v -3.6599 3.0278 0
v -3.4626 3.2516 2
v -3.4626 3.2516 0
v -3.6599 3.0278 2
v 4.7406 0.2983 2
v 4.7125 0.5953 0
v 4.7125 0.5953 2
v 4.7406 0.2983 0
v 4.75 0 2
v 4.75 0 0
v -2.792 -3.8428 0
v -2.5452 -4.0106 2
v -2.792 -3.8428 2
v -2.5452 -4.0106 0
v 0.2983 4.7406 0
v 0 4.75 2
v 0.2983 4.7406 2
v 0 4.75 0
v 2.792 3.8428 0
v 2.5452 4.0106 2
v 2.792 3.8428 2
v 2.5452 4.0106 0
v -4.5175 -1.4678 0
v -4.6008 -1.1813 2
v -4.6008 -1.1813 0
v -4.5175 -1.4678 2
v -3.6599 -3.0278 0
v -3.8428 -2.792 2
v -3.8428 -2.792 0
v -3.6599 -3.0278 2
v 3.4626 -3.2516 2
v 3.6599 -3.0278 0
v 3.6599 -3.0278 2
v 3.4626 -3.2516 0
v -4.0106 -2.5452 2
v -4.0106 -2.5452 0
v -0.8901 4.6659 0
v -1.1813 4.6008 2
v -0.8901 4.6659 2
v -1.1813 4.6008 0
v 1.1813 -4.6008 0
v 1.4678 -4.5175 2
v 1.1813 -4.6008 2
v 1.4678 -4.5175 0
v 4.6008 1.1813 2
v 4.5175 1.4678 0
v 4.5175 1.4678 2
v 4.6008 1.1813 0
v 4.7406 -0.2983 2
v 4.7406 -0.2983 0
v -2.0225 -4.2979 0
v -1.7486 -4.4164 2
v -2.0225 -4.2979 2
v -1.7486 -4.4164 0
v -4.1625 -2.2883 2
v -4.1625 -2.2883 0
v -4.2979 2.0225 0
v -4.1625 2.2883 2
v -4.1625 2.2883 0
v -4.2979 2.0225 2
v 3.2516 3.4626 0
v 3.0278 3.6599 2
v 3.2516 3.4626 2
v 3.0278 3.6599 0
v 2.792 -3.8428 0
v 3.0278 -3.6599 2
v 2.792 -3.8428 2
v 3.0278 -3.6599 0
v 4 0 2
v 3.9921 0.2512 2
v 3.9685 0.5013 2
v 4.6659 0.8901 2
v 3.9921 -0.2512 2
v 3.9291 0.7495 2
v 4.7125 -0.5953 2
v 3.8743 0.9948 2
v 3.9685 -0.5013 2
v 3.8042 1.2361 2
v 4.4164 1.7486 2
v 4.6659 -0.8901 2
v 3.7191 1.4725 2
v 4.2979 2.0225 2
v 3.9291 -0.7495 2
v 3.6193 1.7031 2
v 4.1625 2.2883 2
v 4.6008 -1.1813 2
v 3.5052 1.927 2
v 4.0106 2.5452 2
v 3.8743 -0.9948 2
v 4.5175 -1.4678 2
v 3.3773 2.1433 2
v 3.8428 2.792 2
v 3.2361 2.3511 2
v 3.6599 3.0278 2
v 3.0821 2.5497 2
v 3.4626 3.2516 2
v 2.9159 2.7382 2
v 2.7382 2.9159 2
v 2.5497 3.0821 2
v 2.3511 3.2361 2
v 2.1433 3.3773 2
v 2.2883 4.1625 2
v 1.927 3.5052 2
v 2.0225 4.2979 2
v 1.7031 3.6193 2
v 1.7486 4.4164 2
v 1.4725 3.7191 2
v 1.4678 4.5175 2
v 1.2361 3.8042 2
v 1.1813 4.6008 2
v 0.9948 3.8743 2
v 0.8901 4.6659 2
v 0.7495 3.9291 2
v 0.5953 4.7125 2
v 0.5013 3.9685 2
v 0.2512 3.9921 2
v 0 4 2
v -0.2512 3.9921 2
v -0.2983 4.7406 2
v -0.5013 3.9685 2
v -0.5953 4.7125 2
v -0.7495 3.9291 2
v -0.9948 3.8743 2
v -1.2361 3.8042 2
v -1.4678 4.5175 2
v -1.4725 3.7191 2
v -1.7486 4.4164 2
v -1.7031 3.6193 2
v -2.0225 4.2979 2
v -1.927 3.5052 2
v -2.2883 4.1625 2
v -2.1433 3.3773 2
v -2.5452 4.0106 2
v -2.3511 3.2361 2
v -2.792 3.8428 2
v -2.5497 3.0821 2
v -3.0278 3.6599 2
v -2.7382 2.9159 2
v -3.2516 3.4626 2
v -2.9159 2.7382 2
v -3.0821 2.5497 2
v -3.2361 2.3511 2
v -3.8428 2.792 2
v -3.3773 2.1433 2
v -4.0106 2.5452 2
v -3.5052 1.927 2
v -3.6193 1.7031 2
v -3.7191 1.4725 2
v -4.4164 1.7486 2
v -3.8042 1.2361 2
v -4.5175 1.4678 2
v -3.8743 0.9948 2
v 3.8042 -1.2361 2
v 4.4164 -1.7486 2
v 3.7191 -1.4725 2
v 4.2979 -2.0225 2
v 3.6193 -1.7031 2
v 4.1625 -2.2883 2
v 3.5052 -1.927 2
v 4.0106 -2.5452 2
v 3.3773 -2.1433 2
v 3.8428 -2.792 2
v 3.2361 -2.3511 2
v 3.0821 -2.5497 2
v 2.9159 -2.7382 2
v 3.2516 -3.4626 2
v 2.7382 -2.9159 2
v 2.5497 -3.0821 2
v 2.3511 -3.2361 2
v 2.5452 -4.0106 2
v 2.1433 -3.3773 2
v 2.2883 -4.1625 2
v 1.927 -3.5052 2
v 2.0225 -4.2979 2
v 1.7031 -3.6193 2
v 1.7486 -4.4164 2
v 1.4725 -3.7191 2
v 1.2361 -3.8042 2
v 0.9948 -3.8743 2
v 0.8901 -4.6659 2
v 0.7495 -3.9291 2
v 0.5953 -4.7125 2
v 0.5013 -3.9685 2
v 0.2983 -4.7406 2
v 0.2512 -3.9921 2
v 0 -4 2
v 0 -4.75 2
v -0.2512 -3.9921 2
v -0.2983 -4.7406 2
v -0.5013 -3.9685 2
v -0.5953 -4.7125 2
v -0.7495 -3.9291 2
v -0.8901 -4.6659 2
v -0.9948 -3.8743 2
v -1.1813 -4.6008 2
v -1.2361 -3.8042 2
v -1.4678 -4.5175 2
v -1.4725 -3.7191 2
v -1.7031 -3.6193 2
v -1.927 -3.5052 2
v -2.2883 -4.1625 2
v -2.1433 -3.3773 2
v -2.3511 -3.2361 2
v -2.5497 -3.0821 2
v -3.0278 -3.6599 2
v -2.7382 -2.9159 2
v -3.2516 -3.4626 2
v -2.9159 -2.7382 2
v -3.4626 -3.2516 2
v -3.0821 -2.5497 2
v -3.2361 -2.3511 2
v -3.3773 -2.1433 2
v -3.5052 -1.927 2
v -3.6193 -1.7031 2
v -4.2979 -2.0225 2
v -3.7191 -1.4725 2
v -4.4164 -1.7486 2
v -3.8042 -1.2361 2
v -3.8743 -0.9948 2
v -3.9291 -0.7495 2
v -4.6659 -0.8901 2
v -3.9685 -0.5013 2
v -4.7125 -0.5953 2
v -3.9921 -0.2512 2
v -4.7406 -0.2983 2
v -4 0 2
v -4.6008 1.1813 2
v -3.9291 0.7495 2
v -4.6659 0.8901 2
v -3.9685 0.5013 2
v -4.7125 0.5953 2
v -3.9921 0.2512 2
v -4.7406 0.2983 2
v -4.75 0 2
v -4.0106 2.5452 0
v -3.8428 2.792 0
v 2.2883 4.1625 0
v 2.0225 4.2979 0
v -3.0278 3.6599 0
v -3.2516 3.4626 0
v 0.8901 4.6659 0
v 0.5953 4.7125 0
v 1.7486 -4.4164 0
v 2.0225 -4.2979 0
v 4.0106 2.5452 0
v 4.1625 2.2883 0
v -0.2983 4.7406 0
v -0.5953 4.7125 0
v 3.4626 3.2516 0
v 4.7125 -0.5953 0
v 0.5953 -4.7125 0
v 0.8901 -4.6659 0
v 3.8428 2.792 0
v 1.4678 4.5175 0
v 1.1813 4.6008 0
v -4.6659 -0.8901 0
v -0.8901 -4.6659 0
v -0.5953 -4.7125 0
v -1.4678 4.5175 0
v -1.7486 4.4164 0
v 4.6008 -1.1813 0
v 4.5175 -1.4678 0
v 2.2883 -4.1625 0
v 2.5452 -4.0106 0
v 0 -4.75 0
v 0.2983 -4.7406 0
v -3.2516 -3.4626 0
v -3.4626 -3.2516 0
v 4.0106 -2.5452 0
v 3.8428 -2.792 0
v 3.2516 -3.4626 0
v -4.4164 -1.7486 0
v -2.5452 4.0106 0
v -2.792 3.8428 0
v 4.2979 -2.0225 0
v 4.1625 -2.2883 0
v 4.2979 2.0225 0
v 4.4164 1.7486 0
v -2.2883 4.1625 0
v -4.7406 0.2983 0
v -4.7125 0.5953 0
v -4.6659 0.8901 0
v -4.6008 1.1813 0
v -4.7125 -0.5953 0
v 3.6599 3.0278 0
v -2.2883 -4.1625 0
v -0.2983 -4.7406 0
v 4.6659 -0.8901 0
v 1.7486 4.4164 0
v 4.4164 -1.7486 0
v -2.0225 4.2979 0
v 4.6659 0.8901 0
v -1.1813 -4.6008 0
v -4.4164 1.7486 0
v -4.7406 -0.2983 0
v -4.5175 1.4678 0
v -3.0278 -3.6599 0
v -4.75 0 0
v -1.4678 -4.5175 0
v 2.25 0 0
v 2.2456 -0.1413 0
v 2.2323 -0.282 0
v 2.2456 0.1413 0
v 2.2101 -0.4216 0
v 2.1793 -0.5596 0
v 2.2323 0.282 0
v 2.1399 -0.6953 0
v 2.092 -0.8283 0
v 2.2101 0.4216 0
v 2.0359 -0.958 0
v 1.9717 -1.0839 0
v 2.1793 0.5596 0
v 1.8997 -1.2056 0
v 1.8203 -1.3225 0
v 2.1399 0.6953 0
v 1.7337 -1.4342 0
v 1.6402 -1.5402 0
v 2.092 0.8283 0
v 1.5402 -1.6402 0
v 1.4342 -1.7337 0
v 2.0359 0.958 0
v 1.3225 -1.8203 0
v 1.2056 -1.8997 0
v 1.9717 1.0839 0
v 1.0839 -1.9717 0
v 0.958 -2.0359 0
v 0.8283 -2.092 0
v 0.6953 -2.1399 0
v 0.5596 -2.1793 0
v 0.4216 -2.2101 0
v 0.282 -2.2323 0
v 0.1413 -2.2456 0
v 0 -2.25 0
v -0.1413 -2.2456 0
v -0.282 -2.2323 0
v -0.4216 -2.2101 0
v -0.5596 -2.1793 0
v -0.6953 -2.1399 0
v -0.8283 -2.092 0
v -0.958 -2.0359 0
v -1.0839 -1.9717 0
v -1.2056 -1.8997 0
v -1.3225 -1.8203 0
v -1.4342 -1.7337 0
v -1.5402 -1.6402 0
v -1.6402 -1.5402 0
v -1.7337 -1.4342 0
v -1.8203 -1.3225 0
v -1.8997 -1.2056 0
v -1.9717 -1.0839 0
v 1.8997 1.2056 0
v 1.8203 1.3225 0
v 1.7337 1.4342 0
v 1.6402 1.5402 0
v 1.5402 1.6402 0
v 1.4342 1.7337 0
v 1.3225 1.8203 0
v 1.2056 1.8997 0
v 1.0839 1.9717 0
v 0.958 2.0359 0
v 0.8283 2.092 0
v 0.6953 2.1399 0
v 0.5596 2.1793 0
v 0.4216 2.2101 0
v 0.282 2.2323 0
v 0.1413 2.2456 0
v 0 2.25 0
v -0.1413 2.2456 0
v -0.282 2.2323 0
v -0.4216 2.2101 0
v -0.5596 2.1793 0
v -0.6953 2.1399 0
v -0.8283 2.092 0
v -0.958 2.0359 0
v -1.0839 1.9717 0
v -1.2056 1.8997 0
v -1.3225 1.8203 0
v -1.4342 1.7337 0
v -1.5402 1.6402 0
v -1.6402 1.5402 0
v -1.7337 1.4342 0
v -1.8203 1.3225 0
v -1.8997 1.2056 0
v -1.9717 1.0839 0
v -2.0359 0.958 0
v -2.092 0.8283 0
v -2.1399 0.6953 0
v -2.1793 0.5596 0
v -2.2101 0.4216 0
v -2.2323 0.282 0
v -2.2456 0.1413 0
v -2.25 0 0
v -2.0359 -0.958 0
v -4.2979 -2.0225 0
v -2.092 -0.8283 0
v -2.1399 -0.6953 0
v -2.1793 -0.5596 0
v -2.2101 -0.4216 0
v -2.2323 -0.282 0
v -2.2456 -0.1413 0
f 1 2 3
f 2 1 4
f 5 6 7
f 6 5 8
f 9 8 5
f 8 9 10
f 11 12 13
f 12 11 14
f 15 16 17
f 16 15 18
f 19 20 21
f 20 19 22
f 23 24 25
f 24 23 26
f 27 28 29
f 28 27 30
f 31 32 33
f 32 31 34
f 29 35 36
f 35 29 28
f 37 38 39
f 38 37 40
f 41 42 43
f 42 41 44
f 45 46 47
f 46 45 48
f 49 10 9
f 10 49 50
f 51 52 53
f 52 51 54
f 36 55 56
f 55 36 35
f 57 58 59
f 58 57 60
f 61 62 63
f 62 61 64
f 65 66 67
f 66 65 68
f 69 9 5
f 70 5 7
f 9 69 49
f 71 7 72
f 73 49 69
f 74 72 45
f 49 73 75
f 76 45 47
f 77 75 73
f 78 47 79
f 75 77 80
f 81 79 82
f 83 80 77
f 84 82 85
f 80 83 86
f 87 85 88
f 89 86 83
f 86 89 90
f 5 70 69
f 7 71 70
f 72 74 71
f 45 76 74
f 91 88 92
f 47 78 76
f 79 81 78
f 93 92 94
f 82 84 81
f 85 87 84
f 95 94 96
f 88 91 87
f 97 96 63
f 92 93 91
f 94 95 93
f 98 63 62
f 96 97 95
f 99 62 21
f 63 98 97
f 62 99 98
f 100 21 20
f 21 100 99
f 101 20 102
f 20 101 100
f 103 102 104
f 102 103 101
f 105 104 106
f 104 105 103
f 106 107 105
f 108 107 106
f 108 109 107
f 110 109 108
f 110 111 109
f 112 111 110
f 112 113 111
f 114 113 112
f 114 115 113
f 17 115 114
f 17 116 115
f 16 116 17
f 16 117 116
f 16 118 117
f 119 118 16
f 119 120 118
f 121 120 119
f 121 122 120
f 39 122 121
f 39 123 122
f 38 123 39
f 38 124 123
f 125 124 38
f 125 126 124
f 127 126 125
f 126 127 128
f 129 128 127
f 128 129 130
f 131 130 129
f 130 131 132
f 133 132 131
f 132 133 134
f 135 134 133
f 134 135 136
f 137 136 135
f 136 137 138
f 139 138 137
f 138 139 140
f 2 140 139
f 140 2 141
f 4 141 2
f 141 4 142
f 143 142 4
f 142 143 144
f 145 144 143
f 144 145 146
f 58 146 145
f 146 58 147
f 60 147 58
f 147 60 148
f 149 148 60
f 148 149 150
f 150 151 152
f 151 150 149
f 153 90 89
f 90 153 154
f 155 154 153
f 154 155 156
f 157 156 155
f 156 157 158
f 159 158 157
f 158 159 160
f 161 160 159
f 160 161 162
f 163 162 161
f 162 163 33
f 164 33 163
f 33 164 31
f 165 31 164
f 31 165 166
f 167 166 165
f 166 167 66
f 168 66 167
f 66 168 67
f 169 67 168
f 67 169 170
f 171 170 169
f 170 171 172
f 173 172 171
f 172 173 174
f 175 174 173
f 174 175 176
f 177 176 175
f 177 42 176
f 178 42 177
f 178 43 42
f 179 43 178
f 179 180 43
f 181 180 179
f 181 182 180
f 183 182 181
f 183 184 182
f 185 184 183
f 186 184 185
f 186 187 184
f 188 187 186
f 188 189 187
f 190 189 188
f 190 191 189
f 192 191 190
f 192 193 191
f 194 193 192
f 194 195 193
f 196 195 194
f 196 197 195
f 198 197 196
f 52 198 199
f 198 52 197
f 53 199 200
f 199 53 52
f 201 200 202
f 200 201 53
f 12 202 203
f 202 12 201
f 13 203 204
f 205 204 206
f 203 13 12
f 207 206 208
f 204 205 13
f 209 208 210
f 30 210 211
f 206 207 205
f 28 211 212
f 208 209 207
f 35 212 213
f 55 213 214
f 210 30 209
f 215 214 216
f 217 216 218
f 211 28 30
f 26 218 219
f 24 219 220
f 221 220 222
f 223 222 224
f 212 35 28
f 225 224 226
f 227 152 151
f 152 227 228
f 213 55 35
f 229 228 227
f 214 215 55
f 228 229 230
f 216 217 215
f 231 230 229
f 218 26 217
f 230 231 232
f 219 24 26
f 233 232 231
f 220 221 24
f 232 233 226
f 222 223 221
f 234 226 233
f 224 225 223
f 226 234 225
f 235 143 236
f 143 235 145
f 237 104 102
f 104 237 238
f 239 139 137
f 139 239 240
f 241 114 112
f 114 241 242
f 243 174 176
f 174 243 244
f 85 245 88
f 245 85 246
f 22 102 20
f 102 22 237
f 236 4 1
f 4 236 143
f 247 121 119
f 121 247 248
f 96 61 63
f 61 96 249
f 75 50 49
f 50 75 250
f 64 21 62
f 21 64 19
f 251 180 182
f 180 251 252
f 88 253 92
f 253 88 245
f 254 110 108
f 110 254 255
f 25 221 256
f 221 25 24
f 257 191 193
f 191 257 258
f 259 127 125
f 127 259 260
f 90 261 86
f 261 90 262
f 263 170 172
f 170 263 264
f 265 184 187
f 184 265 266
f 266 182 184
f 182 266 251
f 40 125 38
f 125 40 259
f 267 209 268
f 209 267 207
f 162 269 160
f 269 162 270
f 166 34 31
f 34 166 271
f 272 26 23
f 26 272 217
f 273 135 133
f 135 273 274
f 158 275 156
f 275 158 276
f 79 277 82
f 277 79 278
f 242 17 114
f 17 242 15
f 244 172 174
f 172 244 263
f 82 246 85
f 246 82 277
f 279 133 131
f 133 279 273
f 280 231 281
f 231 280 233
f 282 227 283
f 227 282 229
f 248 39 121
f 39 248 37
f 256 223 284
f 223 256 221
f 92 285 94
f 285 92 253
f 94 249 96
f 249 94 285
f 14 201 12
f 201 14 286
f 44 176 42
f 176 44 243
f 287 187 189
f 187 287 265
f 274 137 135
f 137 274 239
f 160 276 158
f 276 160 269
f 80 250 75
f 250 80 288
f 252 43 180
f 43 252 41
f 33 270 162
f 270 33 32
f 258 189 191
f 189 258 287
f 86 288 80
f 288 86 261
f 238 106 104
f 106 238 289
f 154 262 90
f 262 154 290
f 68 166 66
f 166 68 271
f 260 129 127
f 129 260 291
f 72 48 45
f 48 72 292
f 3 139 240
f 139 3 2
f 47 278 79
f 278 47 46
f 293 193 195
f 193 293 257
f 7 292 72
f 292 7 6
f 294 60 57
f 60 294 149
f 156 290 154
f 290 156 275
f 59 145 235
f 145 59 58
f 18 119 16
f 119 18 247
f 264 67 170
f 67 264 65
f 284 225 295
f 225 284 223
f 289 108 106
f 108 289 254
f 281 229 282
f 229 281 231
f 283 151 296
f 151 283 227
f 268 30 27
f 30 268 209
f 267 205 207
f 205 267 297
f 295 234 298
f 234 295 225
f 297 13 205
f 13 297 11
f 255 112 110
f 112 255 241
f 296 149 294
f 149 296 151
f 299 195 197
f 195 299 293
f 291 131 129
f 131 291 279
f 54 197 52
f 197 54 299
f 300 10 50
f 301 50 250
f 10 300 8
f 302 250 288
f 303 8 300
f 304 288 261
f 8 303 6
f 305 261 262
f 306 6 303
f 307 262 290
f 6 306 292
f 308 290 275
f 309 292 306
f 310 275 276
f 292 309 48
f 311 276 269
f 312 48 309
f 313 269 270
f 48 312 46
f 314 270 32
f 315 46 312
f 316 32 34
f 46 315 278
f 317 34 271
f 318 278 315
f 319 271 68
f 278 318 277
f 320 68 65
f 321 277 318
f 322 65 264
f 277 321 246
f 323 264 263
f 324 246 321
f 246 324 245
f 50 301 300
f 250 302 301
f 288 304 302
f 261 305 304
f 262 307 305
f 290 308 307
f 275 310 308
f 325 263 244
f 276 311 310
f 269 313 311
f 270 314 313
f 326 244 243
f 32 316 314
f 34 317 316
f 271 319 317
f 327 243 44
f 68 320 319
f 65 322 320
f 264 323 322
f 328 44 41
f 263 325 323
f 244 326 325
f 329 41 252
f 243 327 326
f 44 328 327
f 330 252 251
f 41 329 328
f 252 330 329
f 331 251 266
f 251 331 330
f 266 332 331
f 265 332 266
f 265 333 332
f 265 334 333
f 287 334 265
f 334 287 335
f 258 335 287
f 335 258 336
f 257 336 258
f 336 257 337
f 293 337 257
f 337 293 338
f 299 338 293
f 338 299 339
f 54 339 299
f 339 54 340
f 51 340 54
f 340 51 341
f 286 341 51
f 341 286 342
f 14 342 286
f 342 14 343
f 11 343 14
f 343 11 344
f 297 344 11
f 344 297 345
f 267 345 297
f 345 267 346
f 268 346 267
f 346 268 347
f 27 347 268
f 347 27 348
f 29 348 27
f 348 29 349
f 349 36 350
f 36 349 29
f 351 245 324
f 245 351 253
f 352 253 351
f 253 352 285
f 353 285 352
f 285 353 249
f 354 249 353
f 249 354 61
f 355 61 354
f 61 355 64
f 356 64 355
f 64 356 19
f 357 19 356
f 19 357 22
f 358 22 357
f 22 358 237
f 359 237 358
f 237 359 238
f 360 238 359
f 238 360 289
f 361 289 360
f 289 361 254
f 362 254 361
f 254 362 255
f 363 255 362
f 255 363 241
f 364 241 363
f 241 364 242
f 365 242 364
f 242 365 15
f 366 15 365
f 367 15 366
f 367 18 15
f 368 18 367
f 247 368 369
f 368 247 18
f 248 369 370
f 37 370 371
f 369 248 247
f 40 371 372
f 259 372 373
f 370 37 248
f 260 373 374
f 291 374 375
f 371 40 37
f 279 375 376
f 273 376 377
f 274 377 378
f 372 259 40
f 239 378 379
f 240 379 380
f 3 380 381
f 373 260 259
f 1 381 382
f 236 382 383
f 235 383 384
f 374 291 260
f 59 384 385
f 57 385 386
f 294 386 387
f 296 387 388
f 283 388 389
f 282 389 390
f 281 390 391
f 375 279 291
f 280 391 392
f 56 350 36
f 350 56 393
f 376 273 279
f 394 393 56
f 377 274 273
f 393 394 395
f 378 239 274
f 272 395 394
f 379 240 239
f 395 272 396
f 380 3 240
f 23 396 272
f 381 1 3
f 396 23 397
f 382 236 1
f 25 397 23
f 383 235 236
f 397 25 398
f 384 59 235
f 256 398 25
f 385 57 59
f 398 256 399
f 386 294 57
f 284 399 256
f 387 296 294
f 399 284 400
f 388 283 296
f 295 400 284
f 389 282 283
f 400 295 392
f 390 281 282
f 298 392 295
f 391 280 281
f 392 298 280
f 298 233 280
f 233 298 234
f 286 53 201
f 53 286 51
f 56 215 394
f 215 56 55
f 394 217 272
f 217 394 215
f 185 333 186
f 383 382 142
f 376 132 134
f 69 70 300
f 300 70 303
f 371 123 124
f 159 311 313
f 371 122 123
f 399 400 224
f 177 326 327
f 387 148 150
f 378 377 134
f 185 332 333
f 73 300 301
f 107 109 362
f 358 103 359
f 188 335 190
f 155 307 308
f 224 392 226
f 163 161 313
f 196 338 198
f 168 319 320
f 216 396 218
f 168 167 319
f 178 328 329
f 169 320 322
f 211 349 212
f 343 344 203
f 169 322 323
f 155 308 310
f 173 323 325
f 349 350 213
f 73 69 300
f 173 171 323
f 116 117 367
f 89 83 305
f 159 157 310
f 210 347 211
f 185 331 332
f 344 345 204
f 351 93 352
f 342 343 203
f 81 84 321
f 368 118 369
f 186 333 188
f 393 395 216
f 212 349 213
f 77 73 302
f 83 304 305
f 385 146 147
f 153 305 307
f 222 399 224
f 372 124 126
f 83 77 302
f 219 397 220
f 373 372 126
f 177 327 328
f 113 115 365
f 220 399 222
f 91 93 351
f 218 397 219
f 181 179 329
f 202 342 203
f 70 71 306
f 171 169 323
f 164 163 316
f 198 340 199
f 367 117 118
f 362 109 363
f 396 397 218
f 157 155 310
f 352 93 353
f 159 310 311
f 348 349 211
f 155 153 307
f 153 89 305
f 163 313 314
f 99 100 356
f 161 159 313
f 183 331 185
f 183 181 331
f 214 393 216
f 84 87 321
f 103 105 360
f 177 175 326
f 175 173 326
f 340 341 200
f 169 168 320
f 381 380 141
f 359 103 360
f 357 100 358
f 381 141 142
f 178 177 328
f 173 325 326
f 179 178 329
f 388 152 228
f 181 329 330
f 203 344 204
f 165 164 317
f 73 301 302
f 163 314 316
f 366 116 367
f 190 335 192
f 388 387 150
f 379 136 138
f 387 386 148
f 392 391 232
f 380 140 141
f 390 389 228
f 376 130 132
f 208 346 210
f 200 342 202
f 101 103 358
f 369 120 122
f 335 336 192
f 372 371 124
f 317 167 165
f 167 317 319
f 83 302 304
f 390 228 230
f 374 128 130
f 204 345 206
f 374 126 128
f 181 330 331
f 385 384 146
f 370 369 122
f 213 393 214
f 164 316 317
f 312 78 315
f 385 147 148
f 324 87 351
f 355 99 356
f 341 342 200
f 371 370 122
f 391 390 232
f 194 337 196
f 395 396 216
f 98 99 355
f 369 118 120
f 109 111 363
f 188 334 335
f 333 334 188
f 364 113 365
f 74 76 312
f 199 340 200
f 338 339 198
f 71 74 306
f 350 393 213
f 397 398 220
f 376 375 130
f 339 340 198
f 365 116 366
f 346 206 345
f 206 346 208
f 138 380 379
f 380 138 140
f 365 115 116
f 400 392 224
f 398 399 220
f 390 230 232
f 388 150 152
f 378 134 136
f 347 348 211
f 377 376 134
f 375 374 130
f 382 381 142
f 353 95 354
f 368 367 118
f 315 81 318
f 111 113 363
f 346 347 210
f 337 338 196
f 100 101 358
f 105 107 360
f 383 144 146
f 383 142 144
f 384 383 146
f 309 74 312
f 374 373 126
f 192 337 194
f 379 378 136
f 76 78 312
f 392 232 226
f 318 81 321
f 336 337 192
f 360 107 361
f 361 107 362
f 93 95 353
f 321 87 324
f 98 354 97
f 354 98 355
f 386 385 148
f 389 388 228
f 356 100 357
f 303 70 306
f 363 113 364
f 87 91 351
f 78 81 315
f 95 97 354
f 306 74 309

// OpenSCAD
/****************************************************************
* title: 1010 rail button
* author: Boris du Reau
* version: 1.0
* date: 13/06/2026
* 
* Description: 
* Howto use it:
*  Compil buttonPart1 and buttonPart2 and export them as STL
* 
* Note that all units are metrics
*****************************************************************/
resolution = 100;

module buttonPart1() {
    difference() {
        union() {
            cylinder(r = 9.5 / 2, h = 2, $fn = resolution);
            cylinder(r = 6.2 / 2, h = 6, $fn = resolution);
        }
        cylinder(r = 4.5 / 2, h = 8, $fn = resolution);

    }
}


module buttonPart2() {
    difference() {
        cylinder(r = 9.5 / 2, h = 2, $fn = resolution);
        cylinder(r = 4.5 / 2, h = 8, $fn = resolution);
        translate([0, 0, 0]) cylinder(r1 = 4.5 / 2, r2 = 8 / 2, h = 2, $fn = resolution);
    }
}

//buttonPart1();
buttonPart2();
